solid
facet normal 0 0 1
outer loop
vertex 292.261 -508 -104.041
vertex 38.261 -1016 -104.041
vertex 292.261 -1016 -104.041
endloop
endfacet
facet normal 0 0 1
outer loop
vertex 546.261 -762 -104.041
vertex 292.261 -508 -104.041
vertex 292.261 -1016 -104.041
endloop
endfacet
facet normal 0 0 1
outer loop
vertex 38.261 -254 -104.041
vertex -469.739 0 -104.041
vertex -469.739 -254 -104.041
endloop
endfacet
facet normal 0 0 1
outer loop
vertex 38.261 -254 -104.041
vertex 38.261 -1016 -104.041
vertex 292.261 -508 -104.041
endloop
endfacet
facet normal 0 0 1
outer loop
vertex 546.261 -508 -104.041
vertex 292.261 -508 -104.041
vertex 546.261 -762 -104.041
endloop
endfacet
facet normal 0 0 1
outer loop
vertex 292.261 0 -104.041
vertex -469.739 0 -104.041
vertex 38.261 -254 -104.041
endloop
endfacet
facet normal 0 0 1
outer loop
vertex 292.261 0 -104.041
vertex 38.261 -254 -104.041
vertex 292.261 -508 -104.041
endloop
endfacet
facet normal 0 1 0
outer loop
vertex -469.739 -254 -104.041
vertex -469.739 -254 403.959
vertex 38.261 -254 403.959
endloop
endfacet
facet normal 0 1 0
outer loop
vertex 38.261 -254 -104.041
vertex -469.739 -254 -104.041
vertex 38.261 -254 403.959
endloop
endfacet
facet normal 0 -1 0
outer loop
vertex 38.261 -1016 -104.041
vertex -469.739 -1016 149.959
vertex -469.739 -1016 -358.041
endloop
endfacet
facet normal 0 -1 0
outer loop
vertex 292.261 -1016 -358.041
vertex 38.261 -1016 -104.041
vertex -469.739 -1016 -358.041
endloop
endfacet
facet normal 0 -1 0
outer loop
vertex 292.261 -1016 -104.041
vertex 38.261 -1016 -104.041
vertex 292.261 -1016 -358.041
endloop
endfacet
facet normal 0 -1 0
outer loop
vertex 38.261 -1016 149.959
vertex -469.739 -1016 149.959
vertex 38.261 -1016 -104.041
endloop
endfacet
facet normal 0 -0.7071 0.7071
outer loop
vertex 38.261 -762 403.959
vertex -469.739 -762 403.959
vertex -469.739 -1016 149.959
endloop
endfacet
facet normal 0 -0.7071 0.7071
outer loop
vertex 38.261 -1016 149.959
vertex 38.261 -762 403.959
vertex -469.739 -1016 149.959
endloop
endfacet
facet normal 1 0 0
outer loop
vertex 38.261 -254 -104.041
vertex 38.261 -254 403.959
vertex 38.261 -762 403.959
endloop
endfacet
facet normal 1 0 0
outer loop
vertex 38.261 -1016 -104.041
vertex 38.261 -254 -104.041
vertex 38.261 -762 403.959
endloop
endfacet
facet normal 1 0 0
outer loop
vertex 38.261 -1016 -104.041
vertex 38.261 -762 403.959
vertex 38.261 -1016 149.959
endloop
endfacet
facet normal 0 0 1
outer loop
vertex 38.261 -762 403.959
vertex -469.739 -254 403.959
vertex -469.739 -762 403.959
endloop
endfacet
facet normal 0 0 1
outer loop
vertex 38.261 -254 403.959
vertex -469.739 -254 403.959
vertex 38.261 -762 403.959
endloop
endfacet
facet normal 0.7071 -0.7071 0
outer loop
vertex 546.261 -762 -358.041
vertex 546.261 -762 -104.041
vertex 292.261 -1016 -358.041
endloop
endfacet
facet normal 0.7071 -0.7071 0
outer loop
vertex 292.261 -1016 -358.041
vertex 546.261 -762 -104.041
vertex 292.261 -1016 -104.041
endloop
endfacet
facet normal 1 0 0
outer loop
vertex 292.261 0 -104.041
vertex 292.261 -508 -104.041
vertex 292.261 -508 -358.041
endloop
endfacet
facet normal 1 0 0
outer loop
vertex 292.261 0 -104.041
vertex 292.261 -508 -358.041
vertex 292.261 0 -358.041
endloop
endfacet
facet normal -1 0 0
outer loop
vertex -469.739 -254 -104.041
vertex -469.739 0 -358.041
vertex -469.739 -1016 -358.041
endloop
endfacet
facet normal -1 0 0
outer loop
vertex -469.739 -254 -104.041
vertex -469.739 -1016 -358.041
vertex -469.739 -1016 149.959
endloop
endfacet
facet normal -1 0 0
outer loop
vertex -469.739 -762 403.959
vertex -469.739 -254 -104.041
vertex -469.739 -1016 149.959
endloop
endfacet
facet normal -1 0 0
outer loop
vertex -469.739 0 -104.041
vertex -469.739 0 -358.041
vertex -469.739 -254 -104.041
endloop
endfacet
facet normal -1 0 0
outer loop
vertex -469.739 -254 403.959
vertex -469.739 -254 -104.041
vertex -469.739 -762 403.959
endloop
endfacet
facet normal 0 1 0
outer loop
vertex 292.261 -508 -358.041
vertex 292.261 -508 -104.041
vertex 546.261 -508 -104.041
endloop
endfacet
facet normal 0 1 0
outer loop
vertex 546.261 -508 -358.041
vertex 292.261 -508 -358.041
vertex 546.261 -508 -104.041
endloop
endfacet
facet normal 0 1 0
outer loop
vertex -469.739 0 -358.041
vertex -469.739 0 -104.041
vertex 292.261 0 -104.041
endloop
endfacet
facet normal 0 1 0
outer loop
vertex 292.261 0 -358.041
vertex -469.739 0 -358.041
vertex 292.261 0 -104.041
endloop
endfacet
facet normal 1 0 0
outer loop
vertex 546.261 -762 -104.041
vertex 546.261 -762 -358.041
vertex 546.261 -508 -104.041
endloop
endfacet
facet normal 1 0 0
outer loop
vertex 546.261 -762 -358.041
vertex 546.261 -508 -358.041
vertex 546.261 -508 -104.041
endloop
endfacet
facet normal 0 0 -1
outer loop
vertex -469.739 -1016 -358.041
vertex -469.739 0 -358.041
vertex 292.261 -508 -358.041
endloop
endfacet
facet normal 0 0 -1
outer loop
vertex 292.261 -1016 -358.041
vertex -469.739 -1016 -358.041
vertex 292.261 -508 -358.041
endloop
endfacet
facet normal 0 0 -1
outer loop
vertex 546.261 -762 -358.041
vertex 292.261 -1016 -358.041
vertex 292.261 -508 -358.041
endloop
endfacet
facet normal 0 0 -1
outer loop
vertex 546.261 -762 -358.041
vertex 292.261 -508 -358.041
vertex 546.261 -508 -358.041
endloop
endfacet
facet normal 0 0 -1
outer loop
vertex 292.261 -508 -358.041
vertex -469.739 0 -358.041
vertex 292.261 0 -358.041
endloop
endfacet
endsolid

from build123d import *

# Parameters (mm, degrees)
F0_W      = 1016
F0_H      = 762
F1_DEPTH  = 1016
F2_W      = 254
F2_H      = 508
F3_DEPTH  = 762
F5_DEPTH  = 508
F7_DEPTH  = 762
F8_DEPTH  = 508
F10_DEPTH = 1016


with BuildPart() as f1:
    # F0 (on Front) → F1 (new body)
    with BuildSketch(Plane.XZ):
        with Locations((38.2611141601, 22.9585352354)):
            Rectangle(F0_W, F0_H)
    extrude(amount=F1_DEPTH)

    # F2 (on face) → F3 (cut)
    with BuildSketch(Plane.XY.offset(403.9585352354)):
        with Locations((419.2611141601, -254)):
            Rectangle(F2_W, F2_H)
    extrude(amount=-F3_DEPTH, mode=Mode.SUBTRACT)

    # F4 (on face) → F5 (cut)
    with BuildSketch(Plane.XY.offset(403.9585352354)):
        Polygon((-469.7388858399, 0), (-469.7388858399, -254), (38.2611141601, -254), (38.2611141601, -1016), (292.2611141601, -1016), (292.2611141601, -762), (546.2611141601, -762), (546.2611141601, -508), (292.2611141601, -508), (292.2611141601, 0), align=None)
    extrude(amount=-F5_DEPTH, mode=Mode.SUBTRACT)

    # F6 (on face) → F7 (cut)
    with BuildSketch(Plane.XY.offset(403.9585352354)):
        Polygon((546.2611141601, -1016), (546.2611141601, -762), (292.2611141601, -1016), align=None)
    extrude(amount=-F7_DEPTH, mode=Mode.SUBTRACT)

    # F8 (cut): a face of the model
    f8_faces = [f1.faces().sort_by_distance(p)[0] for p in [
        (376.9277808268, -846.6666666667, 403.9585352354),
    ]]
    extrude(f8_faces, amount=-F8_DEPTH, mode=Mode.SUBTRACT)

    # F9 (on face) → F10 (cut)
    with BuildSketch(Plane(origin=(-469.7388858399, 0, 0), x_dir=(0, -1, 0), z_dir=(-1, 0, 0))):
        Polygon((1016, 403.9585352354), (762, 403.9585352354), (1016, 149.9585352354), align=None)
    extrude(amount=-F10_DEPTH, mode=Mode.SUBTRACT)


solid = f1.part
